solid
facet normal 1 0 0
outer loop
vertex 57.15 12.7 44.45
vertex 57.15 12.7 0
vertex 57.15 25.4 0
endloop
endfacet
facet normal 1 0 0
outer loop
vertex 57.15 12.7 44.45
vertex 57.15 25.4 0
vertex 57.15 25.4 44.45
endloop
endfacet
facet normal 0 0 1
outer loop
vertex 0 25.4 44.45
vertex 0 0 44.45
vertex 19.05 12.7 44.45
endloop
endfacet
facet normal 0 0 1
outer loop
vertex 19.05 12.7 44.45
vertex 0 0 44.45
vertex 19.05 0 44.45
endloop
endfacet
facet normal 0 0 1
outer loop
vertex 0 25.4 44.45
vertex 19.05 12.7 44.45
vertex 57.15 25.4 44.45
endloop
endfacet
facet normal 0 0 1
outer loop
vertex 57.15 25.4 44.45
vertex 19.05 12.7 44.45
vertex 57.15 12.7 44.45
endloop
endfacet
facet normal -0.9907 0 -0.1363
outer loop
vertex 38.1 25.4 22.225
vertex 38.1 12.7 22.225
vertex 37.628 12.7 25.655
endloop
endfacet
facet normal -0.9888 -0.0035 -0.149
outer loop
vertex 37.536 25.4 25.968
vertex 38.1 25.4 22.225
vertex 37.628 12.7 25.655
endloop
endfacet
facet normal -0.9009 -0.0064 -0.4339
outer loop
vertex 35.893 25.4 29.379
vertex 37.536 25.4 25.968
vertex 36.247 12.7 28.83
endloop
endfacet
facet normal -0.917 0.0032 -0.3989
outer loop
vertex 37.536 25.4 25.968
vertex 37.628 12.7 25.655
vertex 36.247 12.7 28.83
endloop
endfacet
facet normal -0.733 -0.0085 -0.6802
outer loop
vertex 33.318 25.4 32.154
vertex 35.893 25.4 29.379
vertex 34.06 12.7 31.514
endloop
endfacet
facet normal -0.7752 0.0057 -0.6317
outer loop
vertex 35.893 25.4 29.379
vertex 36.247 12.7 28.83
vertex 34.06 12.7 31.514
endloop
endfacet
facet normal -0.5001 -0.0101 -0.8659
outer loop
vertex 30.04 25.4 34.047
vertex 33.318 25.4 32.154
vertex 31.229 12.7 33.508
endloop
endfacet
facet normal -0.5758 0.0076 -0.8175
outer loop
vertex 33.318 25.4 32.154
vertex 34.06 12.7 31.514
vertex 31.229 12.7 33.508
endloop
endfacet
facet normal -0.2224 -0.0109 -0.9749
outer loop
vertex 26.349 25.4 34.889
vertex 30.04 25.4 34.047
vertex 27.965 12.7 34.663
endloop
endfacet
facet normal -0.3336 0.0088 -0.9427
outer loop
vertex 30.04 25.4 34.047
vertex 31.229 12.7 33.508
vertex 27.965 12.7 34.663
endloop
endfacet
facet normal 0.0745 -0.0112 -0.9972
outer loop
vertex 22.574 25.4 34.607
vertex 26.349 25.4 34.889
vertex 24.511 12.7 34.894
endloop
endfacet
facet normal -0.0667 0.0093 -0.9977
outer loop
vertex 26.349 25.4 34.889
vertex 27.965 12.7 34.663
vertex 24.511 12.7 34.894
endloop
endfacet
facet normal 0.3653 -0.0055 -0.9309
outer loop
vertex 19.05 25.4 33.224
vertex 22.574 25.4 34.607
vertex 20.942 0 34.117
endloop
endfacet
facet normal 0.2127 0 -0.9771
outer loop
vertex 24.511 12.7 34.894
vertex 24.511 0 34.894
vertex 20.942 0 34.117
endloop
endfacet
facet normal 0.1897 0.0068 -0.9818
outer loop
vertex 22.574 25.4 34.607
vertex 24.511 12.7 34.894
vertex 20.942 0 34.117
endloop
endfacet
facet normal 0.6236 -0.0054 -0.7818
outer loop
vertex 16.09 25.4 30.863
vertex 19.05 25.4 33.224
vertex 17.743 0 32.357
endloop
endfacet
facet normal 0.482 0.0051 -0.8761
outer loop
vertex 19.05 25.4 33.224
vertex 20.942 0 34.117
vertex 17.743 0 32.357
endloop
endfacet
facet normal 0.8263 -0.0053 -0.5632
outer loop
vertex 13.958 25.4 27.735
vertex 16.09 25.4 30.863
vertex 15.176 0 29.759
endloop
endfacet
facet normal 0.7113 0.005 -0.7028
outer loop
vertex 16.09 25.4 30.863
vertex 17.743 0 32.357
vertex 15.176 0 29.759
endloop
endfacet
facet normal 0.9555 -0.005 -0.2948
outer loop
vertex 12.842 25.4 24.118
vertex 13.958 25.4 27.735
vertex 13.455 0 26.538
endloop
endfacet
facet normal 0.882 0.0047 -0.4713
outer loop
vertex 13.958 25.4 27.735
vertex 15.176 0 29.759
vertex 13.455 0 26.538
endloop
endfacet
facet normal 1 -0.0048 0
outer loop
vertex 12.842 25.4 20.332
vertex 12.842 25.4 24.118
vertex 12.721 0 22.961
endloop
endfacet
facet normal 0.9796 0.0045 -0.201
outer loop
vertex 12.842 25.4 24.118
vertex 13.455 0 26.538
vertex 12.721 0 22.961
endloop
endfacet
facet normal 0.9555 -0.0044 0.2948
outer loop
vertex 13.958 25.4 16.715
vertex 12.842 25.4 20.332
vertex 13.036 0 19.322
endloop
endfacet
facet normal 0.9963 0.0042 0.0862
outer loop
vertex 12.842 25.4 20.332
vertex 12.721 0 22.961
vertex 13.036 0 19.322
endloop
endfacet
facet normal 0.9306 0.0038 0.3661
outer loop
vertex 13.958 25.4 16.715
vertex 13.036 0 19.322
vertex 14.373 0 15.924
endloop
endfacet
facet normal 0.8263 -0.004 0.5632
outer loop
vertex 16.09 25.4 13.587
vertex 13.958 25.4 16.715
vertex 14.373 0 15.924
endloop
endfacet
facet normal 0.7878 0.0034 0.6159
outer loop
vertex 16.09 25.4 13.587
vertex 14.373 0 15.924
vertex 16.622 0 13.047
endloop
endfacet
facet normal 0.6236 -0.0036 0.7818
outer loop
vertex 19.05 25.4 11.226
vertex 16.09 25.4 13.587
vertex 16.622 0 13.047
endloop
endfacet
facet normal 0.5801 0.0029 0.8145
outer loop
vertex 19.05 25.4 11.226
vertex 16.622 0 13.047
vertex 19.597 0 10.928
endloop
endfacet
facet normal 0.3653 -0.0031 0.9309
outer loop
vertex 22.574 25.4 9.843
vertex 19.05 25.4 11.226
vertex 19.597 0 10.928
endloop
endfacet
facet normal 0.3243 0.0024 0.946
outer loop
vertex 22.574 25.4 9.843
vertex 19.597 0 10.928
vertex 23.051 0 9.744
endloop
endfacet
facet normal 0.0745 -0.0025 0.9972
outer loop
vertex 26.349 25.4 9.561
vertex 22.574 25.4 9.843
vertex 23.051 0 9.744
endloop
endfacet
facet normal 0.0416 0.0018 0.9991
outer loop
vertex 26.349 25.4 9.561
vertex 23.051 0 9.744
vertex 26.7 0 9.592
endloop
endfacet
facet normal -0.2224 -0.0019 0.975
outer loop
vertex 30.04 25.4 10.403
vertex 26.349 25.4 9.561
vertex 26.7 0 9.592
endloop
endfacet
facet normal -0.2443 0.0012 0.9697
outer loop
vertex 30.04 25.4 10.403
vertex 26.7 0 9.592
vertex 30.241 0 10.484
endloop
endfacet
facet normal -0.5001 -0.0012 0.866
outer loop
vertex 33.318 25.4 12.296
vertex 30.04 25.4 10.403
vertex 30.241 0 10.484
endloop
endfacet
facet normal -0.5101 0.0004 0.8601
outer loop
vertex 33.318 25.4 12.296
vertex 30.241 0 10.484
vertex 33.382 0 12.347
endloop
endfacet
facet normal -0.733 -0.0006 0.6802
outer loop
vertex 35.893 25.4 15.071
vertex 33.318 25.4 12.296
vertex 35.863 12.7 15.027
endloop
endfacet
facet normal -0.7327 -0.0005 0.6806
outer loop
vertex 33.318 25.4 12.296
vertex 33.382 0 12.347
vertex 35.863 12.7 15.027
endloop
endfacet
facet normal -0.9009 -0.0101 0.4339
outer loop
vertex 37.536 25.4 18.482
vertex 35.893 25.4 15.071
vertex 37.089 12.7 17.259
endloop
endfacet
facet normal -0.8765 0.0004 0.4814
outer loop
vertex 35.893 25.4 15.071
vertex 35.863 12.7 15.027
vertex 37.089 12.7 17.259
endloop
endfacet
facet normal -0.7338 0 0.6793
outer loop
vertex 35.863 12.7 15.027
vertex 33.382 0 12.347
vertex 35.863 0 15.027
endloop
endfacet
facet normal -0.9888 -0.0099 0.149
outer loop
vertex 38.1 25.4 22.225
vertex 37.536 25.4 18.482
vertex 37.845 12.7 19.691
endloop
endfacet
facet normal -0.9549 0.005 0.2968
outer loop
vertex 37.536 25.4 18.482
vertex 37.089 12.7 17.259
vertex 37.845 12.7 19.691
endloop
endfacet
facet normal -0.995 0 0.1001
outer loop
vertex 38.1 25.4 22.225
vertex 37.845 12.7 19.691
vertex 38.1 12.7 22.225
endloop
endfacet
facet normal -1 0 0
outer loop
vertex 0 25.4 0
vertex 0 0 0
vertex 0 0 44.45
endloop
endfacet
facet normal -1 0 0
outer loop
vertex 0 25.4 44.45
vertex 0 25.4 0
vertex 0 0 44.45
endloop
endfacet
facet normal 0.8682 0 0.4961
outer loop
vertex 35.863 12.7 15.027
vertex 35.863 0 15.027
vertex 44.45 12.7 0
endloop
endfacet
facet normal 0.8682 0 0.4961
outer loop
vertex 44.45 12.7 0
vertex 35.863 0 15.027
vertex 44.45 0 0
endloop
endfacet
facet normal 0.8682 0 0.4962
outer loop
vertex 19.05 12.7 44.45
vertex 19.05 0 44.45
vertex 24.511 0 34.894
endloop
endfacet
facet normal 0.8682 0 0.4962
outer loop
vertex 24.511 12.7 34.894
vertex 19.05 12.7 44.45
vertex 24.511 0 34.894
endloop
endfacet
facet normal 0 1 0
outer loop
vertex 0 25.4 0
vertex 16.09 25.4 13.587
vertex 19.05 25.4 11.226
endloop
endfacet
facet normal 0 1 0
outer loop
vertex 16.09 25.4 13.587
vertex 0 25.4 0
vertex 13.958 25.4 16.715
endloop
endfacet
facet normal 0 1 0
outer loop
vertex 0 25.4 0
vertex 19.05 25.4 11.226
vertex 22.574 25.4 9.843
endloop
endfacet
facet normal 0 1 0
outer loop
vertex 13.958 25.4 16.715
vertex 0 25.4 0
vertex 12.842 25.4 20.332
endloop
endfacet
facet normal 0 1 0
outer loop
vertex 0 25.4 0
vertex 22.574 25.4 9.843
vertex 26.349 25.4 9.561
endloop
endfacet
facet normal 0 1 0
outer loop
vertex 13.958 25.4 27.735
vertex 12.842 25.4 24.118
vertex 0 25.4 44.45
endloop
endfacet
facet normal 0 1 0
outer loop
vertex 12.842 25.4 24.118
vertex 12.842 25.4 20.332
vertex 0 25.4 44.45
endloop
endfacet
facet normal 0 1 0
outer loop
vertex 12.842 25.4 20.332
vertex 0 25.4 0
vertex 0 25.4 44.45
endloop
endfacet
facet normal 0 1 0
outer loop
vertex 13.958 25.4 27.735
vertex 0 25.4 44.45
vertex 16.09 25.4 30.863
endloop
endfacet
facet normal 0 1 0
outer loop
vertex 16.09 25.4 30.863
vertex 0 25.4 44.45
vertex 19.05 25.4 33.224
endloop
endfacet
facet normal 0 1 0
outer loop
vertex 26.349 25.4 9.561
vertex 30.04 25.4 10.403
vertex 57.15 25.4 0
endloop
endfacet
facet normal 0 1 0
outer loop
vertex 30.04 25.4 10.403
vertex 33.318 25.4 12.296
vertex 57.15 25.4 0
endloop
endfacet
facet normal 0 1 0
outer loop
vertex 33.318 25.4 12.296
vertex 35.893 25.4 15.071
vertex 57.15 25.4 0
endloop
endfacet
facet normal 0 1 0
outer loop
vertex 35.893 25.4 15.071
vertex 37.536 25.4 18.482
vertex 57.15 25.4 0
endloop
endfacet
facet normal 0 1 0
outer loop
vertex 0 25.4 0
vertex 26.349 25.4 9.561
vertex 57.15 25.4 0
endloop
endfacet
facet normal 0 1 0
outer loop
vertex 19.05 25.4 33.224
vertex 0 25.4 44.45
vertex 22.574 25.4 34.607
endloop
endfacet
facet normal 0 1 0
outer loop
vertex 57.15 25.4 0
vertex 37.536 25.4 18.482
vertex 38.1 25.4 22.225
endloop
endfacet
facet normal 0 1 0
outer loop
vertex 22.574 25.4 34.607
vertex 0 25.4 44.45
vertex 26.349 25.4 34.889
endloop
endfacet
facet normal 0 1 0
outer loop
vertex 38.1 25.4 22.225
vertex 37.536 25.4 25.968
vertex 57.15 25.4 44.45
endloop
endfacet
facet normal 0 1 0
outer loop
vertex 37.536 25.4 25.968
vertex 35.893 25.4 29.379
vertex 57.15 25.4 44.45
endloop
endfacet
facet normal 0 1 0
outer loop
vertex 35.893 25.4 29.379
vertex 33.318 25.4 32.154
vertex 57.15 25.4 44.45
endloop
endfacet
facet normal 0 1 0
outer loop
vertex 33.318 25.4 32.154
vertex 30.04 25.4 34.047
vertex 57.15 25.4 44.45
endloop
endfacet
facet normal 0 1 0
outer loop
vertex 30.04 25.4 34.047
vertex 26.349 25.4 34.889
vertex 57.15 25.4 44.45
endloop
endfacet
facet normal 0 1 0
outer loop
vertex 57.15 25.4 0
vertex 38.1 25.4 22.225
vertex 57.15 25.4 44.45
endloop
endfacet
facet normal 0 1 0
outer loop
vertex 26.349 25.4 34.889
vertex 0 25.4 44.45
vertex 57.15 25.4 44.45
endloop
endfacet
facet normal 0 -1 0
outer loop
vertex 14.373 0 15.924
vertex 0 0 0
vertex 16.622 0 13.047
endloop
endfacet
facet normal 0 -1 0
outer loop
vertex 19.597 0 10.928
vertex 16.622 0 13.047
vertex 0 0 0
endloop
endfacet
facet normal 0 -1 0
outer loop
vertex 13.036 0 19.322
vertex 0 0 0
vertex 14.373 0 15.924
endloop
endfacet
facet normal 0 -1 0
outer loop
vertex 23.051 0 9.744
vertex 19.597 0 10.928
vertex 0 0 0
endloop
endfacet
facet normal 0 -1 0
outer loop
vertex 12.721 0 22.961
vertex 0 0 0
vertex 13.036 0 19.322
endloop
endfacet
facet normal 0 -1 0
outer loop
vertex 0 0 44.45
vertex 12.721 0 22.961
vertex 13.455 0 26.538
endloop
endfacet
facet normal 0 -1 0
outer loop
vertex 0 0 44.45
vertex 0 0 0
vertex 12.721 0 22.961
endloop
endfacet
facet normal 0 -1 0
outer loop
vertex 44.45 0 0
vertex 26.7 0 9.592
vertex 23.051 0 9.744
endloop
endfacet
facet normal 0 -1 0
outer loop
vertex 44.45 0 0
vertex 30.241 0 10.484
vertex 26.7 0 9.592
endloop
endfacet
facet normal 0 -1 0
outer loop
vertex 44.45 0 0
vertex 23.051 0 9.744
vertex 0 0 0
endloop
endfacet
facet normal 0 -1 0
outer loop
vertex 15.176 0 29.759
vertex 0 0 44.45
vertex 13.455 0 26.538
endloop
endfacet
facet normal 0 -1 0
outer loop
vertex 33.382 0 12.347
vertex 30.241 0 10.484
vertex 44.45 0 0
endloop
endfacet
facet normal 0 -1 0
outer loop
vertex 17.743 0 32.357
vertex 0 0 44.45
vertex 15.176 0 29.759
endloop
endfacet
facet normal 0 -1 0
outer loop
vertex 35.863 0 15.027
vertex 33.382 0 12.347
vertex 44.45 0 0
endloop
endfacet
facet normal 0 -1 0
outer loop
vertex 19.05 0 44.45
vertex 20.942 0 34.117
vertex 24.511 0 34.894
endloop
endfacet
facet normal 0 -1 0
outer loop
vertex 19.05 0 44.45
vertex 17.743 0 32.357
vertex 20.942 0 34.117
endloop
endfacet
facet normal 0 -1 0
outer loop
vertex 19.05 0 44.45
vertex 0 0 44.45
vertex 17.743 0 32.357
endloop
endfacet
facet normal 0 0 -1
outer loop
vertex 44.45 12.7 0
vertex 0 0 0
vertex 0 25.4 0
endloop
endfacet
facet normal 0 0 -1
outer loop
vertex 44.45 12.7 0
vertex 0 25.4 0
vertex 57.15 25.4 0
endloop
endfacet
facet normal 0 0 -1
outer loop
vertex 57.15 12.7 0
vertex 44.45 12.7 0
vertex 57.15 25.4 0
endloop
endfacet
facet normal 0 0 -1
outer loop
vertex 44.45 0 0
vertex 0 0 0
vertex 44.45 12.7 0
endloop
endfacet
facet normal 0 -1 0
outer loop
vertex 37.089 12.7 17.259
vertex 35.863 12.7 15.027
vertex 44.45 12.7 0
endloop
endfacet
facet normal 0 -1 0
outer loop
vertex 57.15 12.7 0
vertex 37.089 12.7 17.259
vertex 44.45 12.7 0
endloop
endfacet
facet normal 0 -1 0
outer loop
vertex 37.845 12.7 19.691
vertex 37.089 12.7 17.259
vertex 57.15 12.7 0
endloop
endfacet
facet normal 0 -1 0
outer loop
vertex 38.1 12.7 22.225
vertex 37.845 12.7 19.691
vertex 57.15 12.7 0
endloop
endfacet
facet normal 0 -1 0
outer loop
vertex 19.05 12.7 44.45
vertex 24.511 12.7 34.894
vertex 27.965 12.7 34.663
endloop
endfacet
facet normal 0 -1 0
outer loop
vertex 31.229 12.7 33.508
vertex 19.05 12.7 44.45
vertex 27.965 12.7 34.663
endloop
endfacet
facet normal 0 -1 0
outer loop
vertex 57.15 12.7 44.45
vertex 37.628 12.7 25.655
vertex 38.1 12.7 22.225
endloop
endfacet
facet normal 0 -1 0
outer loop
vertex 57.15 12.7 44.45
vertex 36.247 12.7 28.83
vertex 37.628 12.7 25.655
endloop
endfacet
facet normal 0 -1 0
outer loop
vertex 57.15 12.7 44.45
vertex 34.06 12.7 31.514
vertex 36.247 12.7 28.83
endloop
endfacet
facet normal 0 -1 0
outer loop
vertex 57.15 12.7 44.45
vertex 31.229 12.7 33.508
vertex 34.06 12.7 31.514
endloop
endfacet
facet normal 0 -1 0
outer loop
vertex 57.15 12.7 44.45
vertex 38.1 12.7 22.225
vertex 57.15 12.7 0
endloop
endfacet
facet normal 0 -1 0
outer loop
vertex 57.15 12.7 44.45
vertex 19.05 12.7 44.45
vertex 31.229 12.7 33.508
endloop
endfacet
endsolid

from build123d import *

# Parameters (mm, degrees)
F0_W     = 57.15
F0_H     = 44.45
F1_DEPTH = 25.4
F2_R     = 12.7
F3_DEPTH = 25.4
F5_DEPTH = 12.7


with BuildPart() as f1:
    # F0 (on Front) → F1 (new body)
    with BuildSketch(Plane.XZ):
        with Locations((28.575, 22.225)):
            Rectangle(F0_W, F0_H)
    extrude(amount=-F1_DEPTH)

    # F2 (on face) → F3 (cut)
    with BuildSketch(Plane.XZ):
        with Locations((25.4, 22.225)):
            Circle(F2_R)
    extrude(amount=-F3_DEPTH, mode=Mode.SUBTRACT)

    # F4 (on face) → F5 (cut)
    with BuildSketch(Plane.XZ):
        with BuildLine():
            Line((24.5106721265, 34.8938237786), (35.8631740273, 15.0269454522))
            ThreePointArc((35.8631740273, 15.0269454522), (37.5279081079, 18.4562011295), (38.1, 22.225))
            ThreePointArc((38.1, 22.225), (34.0601251725, 31.5143612265), (24.5106721265, 34.8938237786))
        make_face()
        with BuildLine():
            Line((44.45, 0), (57.15, 0))
            Line((57.15, 0), (57.15, 44.45))
            Line((57.15, 44.45), (19.05, 44.45))
            Line((19.05, 44.45), (24.5106721265, 34.8938237786))
            ThreePointArc((24.5106721265, 34.8938237786), (34.0601251725, 31.5143612265), (38.1, 22.225))
            ThreePointArc((38.1, 22.225), (37.5279081079, 18.4562011295), (35.8631740273, 15.0269454522))
            Line((35.8631740273, 15.0269454522), (44.45, 0))
        make_face()
    extrude(amount=-F5_DEPTH, mode=Mode.SUBTRACT)


solid = f1.part
